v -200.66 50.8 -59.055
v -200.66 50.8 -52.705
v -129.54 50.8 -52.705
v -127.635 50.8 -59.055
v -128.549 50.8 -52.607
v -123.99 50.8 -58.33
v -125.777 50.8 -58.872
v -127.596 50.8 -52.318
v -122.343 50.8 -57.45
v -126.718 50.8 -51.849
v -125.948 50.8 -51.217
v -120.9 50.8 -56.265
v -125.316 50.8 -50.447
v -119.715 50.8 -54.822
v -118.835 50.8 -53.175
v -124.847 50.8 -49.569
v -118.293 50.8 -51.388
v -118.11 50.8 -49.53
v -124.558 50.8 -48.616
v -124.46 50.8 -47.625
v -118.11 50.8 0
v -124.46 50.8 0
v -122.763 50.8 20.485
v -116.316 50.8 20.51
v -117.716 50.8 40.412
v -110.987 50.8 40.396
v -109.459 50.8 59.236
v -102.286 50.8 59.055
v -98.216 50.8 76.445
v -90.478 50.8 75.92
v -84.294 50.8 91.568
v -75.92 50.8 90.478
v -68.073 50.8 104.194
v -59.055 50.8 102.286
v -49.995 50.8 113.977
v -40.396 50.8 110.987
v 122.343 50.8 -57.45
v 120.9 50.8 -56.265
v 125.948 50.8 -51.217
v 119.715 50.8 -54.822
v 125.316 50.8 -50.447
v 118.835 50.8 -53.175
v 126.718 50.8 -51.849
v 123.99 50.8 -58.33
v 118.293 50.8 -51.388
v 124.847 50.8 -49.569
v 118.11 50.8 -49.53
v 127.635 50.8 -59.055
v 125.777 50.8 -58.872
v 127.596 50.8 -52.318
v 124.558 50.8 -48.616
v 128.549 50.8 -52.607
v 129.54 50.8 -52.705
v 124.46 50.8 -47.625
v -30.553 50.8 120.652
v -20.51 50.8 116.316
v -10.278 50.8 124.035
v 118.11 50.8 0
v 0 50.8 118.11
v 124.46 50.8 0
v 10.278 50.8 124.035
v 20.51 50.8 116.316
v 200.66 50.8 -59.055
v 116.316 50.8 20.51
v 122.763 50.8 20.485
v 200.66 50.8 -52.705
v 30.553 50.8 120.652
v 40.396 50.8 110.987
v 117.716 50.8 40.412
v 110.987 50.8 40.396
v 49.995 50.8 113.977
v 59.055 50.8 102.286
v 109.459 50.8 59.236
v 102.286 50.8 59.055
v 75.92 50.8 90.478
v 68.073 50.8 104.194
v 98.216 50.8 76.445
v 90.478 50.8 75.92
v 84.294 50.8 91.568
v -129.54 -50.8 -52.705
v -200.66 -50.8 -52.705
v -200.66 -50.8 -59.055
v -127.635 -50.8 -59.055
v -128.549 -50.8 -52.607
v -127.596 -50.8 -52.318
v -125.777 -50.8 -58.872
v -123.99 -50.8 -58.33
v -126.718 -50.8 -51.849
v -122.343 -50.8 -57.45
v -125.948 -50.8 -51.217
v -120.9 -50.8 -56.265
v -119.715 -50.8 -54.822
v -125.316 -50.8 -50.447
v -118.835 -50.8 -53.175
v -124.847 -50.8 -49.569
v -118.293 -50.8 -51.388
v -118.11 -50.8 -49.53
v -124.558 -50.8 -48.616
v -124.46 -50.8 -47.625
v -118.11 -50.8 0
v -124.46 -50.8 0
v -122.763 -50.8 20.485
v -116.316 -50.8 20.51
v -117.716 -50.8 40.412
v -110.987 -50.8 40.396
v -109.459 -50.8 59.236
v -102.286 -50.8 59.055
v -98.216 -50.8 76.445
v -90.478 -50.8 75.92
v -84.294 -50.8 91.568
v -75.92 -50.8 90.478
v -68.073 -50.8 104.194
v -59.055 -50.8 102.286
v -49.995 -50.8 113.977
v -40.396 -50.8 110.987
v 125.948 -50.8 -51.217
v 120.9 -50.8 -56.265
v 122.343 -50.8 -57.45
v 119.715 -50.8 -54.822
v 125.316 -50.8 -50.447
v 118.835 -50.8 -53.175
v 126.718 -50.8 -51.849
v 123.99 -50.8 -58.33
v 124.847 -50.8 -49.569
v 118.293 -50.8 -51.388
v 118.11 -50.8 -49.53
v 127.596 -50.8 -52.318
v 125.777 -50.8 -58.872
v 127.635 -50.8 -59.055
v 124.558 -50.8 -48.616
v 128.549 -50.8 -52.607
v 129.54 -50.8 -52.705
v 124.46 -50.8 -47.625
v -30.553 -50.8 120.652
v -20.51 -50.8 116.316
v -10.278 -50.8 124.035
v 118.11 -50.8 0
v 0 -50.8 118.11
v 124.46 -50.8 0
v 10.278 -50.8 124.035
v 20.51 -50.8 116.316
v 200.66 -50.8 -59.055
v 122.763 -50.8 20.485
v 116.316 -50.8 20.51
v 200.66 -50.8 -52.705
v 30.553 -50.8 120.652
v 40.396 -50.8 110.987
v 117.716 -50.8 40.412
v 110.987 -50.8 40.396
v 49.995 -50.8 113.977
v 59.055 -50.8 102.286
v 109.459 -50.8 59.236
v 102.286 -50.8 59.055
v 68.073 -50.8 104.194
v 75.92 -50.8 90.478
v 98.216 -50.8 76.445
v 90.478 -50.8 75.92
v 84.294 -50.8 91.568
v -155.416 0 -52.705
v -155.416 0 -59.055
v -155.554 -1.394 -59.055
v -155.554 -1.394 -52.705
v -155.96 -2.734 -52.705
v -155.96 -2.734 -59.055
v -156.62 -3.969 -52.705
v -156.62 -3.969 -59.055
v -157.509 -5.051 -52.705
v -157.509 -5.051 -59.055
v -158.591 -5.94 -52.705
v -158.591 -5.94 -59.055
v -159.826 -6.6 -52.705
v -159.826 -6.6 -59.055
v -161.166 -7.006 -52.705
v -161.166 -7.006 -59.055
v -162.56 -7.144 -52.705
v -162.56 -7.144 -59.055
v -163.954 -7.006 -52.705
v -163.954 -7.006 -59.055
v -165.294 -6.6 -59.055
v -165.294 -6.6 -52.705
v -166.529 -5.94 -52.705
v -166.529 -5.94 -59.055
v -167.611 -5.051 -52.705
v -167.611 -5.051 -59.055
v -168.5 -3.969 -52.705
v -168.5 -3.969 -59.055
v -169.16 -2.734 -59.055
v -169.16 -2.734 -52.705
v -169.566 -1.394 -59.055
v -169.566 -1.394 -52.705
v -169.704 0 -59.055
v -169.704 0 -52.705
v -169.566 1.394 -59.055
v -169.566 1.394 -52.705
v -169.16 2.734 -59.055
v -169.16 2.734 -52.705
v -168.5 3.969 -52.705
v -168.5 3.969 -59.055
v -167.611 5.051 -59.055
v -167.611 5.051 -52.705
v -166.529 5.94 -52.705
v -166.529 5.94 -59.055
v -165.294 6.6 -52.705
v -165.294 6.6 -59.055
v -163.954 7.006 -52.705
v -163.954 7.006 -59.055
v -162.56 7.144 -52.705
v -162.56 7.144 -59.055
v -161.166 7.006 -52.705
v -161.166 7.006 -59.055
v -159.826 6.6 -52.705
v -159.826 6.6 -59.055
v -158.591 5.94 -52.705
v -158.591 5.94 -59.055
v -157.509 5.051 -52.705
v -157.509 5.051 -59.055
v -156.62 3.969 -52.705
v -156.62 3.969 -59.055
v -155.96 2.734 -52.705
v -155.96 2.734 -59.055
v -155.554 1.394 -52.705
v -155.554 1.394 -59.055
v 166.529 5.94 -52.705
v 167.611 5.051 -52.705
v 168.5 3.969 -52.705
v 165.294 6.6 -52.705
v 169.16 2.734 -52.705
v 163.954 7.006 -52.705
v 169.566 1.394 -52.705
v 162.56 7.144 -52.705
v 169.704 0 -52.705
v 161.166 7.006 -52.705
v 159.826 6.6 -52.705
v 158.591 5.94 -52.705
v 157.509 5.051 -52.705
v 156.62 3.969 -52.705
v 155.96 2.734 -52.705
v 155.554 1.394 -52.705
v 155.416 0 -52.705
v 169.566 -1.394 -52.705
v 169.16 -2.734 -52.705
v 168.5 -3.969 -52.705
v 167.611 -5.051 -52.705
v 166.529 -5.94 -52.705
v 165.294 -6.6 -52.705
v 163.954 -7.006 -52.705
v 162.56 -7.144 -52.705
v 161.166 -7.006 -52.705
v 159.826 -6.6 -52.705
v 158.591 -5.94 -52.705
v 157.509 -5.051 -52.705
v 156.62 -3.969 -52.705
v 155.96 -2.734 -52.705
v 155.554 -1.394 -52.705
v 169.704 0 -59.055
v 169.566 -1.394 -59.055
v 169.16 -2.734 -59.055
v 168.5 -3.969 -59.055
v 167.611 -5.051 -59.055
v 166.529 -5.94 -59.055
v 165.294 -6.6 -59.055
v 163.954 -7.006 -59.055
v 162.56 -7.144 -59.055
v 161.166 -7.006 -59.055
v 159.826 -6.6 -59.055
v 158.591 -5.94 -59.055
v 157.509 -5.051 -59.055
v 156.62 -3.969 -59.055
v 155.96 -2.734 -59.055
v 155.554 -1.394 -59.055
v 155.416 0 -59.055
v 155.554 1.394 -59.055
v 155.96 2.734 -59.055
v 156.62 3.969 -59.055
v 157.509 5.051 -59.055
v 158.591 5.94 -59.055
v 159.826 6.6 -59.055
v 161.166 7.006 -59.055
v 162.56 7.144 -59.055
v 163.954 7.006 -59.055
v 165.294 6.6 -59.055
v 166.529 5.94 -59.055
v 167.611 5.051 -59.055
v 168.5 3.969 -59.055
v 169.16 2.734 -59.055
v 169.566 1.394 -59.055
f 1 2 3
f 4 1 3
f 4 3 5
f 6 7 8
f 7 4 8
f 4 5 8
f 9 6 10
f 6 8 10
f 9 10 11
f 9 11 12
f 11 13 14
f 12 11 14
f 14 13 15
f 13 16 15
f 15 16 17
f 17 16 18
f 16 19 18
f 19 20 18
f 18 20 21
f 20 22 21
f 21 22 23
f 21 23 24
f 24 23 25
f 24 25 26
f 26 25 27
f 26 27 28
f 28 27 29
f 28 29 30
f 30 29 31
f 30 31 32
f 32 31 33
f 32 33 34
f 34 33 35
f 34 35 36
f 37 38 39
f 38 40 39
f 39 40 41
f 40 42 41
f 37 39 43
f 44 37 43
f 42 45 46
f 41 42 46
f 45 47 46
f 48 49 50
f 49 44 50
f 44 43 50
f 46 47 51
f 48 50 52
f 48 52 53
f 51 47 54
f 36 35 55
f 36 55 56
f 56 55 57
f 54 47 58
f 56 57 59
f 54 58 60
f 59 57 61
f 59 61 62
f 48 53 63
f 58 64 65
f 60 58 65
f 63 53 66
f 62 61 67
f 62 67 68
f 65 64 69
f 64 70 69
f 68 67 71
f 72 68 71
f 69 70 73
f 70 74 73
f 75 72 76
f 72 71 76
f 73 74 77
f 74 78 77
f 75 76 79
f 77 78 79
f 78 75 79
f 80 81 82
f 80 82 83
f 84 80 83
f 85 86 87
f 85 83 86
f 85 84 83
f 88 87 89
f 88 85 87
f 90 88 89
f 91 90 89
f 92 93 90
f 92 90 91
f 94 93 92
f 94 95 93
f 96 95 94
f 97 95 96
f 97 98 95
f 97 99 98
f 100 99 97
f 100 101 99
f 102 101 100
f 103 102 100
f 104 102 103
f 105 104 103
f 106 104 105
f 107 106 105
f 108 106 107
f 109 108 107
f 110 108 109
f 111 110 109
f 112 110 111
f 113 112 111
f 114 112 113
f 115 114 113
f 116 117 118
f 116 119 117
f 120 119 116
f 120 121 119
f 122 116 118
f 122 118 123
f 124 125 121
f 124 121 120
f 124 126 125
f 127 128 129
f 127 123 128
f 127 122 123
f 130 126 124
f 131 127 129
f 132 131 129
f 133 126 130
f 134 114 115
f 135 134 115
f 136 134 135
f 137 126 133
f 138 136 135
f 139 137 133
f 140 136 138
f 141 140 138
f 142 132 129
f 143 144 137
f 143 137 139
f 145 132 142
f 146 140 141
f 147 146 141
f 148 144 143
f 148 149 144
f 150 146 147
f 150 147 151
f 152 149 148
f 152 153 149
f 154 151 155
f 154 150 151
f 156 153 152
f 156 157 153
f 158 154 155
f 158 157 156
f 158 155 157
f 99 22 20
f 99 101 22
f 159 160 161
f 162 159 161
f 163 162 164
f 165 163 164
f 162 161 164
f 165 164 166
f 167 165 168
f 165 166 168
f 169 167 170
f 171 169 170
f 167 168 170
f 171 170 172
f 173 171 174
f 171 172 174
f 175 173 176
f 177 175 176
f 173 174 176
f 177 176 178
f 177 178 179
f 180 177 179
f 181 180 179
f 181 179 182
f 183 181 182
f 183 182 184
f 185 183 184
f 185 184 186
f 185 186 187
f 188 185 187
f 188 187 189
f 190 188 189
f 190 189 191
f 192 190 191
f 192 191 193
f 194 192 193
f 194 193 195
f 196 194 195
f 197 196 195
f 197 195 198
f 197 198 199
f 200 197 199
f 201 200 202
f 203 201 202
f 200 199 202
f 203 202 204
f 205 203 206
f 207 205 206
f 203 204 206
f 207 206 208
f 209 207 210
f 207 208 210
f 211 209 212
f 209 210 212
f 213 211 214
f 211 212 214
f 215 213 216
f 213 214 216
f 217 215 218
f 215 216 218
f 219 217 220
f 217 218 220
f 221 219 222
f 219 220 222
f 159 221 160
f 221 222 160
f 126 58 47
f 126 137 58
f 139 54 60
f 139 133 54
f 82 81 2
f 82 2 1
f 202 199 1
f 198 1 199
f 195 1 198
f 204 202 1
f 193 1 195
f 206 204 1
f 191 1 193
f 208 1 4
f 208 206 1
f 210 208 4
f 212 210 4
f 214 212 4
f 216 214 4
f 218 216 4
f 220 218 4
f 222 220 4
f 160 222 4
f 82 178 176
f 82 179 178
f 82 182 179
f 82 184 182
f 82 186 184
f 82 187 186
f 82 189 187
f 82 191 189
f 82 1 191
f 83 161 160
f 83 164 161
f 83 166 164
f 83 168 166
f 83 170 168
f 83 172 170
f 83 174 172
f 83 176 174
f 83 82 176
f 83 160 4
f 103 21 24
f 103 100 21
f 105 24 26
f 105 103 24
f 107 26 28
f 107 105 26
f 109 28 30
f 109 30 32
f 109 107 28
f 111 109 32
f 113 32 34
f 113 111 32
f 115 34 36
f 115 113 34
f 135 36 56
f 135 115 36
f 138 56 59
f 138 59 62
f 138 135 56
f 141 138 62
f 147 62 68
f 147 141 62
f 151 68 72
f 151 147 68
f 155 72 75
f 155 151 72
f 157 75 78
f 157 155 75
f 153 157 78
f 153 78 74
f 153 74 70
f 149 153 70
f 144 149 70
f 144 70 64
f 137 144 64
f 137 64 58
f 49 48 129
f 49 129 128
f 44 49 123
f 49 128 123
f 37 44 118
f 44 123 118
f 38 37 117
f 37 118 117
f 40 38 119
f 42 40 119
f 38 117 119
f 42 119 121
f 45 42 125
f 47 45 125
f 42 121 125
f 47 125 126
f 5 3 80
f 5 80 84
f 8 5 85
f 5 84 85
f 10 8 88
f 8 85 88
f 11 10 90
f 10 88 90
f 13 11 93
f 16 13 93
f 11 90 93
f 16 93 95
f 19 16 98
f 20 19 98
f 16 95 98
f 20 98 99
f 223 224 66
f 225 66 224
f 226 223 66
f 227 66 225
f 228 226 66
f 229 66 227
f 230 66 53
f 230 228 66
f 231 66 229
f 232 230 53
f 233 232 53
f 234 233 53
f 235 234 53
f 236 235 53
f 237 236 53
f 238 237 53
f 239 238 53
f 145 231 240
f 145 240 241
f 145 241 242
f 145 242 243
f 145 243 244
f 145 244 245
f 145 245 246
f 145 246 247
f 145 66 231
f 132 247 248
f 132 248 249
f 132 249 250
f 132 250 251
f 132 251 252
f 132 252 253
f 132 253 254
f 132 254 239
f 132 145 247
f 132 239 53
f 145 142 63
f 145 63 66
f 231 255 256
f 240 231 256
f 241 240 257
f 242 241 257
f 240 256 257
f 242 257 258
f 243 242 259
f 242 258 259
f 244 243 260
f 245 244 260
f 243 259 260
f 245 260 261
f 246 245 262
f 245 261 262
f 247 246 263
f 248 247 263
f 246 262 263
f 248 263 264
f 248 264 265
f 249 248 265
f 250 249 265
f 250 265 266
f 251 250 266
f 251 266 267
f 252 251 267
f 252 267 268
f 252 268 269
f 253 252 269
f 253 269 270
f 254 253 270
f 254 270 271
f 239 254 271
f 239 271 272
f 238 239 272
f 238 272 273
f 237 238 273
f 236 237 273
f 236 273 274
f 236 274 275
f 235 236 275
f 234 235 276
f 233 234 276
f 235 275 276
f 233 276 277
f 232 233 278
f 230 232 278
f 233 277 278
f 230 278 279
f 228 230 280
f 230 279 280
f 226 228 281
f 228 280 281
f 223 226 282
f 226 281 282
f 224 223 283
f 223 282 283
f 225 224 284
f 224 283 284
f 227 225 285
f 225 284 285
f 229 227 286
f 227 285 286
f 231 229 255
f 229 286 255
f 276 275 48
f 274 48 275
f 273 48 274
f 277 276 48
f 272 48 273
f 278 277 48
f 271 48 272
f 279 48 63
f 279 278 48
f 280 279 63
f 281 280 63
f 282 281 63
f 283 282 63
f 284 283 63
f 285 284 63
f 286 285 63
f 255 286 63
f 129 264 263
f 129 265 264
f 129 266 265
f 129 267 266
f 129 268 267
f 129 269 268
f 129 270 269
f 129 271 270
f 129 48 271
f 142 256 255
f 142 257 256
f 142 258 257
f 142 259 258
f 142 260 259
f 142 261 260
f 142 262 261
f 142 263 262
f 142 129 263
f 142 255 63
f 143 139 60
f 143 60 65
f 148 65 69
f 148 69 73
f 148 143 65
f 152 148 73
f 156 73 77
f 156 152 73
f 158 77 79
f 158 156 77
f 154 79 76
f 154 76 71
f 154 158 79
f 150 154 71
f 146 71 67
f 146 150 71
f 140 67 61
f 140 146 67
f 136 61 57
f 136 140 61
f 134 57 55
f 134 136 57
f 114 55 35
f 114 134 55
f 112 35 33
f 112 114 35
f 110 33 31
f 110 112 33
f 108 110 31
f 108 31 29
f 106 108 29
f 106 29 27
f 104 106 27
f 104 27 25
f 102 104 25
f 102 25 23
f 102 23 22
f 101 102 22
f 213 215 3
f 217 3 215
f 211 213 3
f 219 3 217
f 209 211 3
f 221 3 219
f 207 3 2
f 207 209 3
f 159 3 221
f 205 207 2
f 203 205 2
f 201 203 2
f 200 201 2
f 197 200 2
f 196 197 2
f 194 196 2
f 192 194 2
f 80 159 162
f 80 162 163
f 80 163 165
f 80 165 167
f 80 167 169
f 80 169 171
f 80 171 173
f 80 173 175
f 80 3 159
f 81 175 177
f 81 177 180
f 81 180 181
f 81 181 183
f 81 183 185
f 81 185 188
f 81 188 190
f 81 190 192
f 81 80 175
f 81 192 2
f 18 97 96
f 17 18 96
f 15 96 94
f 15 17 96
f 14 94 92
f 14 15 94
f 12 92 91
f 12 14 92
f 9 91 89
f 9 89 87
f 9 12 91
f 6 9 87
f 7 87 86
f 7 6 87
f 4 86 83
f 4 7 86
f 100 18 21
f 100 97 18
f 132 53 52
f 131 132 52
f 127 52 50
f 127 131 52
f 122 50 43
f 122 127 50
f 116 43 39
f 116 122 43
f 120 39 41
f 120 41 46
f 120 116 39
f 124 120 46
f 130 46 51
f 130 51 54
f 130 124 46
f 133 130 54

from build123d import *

# Parameters (mm, degrees)
F1_DEPTH = 50.8
F3_R     = 9.525
F4_R     = 5.08
F2_R     = 7.14375
F5_DEPTH = 25.4


with BuildPart() as f1:
    # F0 (on Front) → F1 (new body, symmetric)
    with BuildSketch(Plane.XZ):
        with BuildLine():
            ThreePointArc((-118.11, 0), (0, 118.11), (118.11, 0))
            Line((118.11, 0), (118.11, -59.055))
            Line((118.11, -59.055), (200.66, -59.055))
            Line((200.66, -59.055), (200.66, -52.705))
            Line((200.66, -52.705), (124.46, -52.705))
            Line((124.46, -52.705), (124.46, 0))
            ThreePointArc((124.46, 0), (0, 124.46), (-124.46, 0))
            Line((-124.46, 0), (-124.46, -52.705))
            Line((-124.46, -52.705), (-200.66, -52.705))
            Line((-200.66, -52.705), (-200.66, -59.055))
            Line((-200.66, -59.055), (-118.11, -59.055))
            Line((-118.11, -59.055), (-118.11, 0))
        make_face()
    extrude(amount=F1_DEPTH, both=True)

    # F3
    f3_edges = [f1.edges().sort_by_distance(p)[0] for p in [
        (-118.11, 0, -59.055),
        (118.11, 0, -59.055),
    ]]
    fillet(f3_edges, radius=F3_R)

    # F4
    f4_edges = [f1.edges().sort_by_distance(p)[0] for p in [
        (-124.46, 0, -52.705),
        (124.46, 0, -52.705),
    ]]
    fillet(f4_edges, radius=F4_R)

    # F2 (on face) → F5 (cut)
    with BuildSketch(Plane(origin=(0, 0, -59.055), x_dir=(1, 0, 0), z_dir=(0, 0, -1))):
        with Locations((-162.56, 0)):
            Circle(F2_R)
        with Locations((162.56, 0)):
            Circle(F2_R)
    extrude(amount=-F5_DEPTH, mode=Mode.SUBTRACT)


solid = f1.part
